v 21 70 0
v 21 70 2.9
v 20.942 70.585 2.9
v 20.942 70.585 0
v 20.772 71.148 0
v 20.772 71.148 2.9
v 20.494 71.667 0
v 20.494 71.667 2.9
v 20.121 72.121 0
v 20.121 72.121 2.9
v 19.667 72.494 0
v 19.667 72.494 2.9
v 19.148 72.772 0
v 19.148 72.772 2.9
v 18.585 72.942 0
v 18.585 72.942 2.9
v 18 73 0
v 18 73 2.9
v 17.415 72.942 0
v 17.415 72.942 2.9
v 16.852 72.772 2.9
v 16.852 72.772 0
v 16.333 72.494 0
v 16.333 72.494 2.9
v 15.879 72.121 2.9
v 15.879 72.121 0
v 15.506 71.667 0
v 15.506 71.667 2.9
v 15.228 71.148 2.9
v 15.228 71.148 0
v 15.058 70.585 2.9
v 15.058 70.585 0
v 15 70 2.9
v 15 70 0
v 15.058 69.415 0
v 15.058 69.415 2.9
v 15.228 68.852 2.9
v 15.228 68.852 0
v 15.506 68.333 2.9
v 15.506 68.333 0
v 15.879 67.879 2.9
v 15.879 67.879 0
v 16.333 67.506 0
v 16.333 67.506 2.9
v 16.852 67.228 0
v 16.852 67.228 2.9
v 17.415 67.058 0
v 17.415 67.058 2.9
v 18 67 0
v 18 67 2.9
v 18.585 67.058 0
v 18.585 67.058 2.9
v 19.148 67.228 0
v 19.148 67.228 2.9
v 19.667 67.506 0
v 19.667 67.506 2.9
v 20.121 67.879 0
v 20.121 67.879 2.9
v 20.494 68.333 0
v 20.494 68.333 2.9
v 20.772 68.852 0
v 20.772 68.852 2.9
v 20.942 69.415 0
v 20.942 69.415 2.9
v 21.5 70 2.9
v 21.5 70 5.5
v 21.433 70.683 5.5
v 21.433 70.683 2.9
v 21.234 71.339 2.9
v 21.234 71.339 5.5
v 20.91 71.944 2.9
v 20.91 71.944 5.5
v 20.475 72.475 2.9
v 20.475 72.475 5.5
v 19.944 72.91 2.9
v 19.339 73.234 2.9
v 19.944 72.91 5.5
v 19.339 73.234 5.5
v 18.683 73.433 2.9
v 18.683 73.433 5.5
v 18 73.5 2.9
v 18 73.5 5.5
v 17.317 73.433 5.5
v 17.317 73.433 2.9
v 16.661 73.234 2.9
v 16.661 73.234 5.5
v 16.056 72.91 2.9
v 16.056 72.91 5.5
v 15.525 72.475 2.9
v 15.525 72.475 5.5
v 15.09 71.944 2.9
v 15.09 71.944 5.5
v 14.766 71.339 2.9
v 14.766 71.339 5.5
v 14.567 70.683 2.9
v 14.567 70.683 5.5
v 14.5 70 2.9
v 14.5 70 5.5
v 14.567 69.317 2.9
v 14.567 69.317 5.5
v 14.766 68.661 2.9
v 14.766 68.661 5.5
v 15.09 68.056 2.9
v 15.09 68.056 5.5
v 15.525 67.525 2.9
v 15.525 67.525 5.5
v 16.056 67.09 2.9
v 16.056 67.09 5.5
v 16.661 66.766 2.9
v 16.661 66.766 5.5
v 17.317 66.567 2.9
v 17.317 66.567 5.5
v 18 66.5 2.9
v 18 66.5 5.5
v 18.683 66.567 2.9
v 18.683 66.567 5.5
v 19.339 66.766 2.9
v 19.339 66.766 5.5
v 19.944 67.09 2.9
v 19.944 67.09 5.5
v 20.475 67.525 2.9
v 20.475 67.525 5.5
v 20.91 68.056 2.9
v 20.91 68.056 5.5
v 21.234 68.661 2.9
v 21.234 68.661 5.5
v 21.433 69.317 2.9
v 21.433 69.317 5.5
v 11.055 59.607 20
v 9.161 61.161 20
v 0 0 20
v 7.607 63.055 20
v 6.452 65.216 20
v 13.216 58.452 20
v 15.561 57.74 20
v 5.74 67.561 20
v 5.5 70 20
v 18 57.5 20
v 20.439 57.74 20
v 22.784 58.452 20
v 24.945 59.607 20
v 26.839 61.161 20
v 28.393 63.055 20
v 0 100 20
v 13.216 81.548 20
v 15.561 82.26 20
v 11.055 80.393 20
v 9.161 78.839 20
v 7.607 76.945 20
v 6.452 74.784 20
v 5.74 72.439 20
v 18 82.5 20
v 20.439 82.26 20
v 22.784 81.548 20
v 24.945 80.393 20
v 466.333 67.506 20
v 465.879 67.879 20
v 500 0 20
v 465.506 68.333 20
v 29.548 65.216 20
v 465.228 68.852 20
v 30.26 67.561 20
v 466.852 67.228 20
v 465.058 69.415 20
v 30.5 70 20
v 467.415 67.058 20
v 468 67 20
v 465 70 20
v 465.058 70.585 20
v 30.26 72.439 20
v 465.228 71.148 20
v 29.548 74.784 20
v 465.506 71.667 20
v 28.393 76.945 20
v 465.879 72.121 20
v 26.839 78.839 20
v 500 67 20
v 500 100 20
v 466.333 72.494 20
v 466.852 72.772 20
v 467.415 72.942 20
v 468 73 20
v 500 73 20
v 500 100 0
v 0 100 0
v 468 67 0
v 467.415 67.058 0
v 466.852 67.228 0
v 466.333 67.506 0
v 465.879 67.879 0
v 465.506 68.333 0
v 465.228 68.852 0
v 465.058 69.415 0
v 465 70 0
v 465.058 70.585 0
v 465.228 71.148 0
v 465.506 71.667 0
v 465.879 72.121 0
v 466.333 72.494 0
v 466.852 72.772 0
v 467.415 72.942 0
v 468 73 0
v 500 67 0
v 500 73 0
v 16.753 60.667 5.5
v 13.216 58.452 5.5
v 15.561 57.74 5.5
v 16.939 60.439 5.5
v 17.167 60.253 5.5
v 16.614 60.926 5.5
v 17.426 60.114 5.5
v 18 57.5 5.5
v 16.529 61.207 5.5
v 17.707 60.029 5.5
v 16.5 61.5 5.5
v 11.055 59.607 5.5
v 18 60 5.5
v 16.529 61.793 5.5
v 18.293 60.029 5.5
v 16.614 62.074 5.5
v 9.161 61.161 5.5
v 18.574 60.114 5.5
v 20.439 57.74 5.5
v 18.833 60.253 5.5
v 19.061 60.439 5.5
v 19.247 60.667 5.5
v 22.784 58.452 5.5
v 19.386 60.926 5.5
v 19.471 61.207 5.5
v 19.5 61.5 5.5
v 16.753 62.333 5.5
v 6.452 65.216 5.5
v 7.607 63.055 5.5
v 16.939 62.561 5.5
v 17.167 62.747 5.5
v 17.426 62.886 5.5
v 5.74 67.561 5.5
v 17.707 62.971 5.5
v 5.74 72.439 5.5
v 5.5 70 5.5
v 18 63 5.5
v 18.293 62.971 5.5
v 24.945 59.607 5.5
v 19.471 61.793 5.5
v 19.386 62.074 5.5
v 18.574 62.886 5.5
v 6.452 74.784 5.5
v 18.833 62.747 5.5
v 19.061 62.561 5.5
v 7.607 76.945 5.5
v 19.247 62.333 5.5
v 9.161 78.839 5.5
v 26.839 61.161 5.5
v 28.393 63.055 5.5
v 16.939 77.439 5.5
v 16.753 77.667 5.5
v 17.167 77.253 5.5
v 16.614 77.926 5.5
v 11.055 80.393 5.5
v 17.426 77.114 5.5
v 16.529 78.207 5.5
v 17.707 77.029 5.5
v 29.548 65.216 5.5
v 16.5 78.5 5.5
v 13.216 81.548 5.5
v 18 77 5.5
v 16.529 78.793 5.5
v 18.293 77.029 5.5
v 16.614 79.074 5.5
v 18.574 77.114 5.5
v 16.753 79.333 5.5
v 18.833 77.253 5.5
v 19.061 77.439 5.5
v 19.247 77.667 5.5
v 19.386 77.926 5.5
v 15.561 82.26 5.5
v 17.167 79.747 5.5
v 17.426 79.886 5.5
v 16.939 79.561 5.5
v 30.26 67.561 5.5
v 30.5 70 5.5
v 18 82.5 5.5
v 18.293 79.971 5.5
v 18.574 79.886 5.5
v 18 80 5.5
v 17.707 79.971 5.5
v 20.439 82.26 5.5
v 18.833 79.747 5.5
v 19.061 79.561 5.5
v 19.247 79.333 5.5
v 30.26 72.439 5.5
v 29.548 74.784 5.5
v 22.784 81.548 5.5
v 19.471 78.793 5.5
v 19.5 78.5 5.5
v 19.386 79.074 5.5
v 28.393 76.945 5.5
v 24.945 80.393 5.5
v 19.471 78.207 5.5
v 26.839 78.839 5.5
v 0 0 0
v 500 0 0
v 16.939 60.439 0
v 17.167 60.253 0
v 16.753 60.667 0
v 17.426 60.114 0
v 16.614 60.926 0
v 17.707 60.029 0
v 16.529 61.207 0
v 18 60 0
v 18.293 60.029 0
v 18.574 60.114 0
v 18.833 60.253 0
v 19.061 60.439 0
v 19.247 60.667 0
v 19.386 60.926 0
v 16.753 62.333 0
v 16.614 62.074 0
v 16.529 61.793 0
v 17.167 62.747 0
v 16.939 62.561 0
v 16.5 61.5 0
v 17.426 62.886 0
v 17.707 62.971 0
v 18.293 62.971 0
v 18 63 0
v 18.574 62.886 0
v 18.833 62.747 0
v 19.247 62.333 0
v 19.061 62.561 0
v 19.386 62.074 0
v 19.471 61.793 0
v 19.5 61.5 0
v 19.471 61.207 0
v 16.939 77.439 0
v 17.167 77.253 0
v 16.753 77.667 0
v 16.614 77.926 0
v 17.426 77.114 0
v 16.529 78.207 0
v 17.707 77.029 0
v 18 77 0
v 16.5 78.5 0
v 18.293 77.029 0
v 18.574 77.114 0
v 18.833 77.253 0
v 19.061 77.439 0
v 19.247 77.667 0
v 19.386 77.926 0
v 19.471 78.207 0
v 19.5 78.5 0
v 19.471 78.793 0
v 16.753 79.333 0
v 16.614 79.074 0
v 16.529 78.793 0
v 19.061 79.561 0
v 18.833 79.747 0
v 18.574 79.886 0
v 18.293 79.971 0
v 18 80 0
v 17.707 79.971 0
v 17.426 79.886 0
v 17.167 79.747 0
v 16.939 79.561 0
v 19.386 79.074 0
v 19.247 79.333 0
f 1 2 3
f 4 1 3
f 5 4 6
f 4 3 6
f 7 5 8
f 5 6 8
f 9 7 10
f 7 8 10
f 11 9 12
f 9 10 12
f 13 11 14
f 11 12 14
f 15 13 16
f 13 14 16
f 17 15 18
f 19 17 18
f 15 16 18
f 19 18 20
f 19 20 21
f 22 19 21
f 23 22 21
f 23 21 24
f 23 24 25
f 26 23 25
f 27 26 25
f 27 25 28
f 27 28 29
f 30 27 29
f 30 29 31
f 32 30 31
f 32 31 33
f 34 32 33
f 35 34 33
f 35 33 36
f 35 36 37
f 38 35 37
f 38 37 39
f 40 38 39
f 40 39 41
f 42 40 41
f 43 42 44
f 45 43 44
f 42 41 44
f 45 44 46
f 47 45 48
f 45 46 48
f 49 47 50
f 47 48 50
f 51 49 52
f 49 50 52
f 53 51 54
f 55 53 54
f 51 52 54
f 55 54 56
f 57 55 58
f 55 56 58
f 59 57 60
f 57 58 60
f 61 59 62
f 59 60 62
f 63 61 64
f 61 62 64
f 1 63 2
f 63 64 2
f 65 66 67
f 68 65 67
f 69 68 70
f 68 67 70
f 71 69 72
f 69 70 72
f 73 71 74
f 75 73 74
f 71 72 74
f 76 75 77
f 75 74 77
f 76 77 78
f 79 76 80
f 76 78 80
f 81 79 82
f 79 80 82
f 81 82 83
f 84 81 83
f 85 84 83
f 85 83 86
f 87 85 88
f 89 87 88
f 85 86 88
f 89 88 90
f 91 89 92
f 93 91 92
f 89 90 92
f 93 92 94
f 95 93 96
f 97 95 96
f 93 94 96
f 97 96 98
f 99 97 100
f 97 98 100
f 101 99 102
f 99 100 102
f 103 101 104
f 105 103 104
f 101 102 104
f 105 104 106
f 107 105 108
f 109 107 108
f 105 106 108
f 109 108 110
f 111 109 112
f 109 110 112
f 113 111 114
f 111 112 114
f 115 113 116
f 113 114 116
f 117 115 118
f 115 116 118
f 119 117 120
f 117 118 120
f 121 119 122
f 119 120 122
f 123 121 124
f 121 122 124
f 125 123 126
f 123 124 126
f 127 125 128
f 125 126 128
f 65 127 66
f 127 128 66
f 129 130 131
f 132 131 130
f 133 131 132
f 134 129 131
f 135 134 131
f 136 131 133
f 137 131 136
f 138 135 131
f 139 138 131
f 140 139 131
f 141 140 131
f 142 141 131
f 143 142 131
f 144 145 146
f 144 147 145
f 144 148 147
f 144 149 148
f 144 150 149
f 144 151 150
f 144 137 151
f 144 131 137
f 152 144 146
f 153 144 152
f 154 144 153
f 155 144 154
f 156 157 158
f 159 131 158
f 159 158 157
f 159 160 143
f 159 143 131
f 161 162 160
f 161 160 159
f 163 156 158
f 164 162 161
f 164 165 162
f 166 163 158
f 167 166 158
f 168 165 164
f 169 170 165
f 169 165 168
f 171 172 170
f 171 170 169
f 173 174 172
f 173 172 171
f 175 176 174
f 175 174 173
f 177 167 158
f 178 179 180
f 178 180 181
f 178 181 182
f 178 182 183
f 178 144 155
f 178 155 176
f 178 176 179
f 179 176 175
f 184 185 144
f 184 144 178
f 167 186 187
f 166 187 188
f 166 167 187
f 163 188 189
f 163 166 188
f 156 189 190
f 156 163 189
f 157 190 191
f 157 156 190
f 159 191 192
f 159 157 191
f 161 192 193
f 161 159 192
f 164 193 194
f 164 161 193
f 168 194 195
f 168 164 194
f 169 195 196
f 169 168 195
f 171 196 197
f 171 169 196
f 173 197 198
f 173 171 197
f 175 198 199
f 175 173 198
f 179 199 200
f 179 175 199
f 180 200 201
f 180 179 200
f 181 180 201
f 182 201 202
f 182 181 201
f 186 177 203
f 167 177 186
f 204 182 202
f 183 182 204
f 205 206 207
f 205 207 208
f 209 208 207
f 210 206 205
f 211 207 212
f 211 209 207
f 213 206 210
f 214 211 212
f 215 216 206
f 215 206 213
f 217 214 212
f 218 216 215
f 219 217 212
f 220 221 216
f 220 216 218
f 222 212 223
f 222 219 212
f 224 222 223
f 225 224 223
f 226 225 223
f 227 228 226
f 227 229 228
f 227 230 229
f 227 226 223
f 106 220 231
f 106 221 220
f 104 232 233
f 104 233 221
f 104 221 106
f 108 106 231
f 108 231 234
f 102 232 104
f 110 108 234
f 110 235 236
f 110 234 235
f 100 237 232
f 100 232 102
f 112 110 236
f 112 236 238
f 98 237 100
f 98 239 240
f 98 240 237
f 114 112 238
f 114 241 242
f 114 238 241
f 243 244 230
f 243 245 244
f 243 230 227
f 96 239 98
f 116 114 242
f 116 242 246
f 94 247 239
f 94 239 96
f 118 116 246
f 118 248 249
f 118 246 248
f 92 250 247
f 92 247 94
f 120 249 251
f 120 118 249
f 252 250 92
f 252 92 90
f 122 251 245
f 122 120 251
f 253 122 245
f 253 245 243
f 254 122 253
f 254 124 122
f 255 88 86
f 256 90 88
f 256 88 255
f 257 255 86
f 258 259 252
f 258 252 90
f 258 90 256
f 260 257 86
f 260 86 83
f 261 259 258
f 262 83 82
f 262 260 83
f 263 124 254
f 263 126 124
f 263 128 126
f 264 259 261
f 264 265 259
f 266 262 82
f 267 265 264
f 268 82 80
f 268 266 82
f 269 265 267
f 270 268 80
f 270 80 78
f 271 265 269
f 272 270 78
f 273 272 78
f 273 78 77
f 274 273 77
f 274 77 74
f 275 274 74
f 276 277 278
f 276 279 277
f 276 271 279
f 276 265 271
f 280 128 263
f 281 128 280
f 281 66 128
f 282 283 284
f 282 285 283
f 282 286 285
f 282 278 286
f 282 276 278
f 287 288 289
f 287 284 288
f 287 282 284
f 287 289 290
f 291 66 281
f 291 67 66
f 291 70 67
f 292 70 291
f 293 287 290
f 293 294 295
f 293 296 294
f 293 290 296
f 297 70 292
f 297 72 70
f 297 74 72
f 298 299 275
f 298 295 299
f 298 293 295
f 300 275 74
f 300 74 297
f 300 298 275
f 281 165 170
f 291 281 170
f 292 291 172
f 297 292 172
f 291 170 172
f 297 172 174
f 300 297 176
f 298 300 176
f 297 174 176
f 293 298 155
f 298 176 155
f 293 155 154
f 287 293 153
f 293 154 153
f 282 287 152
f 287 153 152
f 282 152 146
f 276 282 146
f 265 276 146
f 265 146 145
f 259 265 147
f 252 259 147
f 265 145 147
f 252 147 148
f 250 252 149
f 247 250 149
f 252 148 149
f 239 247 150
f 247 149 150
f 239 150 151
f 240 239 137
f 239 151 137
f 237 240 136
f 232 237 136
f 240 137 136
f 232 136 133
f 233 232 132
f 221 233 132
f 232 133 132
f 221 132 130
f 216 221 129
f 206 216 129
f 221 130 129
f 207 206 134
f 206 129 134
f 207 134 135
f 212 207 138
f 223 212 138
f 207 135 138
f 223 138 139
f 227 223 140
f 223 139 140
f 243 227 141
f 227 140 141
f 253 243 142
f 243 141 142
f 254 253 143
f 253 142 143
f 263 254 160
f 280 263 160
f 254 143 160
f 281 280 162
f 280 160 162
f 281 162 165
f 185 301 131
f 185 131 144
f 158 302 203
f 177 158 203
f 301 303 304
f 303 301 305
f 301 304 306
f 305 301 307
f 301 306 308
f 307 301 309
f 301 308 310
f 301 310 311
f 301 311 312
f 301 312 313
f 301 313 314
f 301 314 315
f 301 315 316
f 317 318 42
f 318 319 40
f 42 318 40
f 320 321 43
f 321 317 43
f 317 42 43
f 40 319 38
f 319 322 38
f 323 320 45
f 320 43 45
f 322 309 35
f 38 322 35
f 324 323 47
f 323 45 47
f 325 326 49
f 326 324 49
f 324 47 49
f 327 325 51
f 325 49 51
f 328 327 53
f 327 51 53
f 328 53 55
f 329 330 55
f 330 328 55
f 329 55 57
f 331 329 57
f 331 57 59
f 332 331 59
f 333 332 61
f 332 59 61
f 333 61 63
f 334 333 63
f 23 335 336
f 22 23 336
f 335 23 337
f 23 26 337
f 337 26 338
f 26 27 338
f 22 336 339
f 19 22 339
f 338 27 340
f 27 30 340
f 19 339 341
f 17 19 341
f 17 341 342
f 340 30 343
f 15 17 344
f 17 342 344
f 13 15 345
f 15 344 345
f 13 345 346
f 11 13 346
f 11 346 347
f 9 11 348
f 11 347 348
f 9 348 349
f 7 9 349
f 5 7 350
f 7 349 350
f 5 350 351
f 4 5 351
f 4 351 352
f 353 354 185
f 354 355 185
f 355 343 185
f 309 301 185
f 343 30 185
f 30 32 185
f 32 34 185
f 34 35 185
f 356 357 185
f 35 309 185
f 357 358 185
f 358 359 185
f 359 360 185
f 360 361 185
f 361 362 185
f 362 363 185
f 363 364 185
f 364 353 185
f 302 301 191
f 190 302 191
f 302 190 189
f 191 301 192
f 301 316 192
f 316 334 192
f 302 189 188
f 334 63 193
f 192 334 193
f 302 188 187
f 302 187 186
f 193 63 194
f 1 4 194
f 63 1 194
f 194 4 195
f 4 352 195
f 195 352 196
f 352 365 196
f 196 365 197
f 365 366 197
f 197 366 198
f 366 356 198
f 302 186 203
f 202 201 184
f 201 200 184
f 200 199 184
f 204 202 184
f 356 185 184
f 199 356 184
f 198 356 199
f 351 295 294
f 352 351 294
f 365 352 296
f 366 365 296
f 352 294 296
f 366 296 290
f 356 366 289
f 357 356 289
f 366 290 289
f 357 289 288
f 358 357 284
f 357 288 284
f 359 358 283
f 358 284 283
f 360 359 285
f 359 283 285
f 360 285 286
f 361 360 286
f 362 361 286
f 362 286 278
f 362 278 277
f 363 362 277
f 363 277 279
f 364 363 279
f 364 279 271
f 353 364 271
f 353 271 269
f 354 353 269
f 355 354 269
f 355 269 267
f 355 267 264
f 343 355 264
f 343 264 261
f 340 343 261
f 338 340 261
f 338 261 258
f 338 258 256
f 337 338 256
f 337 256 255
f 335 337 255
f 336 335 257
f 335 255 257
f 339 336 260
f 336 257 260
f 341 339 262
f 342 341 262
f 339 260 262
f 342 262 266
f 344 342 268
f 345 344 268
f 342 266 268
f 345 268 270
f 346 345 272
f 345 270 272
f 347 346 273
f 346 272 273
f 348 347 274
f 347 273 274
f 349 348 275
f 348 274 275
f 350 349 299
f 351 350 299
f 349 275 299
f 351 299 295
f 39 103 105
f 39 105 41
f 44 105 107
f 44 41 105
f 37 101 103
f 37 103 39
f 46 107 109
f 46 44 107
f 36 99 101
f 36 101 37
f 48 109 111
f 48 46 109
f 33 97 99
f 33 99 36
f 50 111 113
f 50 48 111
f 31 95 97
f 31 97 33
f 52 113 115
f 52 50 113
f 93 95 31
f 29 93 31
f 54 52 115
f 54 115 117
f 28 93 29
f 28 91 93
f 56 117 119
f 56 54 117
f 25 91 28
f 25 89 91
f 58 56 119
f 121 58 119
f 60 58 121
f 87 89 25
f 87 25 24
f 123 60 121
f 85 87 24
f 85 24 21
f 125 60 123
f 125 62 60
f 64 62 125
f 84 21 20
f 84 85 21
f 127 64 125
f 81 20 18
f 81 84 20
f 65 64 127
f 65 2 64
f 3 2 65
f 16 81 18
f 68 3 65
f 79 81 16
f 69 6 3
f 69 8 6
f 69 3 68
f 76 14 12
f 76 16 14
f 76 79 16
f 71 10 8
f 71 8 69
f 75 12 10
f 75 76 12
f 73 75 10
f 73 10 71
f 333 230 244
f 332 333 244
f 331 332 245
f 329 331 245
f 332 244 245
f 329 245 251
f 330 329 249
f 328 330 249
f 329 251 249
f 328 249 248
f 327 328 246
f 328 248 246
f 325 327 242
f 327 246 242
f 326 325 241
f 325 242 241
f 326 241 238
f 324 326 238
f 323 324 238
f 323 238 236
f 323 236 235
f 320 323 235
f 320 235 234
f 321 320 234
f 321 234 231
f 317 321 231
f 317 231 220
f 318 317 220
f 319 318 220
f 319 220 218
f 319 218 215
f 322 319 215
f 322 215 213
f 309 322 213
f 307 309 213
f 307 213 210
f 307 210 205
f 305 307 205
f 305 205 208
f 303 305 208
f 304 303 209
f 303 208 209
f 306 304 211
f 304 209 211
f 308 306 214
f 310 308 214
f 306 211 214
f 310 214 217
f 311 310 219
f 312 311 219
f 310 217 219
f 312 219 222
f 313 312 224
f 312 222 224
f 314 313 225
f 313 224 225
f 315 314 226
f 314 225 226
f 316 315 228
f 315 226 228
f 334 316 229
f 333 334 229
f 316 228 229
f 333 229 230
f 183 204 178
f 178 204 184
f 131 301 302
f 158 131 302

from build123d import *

# Parameters (mm, degrees)
SKETCH1_W           = 500
SKETCH1_H           = 100
BOSS_EXTRUDE1_DEPTH = 20
SKETCH2_R           = 3
CUT_EXTRUDE1_DEPTH  = 511.294032887
SKETCH3_R           = 12.5
CUT_EXTRUDE2_DEPTH  = 14.5
SKETCH4_R           = 3.5
CUT_EXTRUDE3_DEPTH  = 2.6
SKETCH5_R           = 1.5
CUT_EXTRUDE4_DEPTH  = 511.108076784


with BuildPart() as part:
    # Sketch1 → Boss-Extrude1 (new body)
    with BuildSketch(Plane.XY):
        with Locations((250, 50)):
            Rectangle(SKETCH1_W, SKETCH1_H)
    extrude(amount=BOSS_EXTRUDE1_DEPTH)

    # Sketch2 → Cut-Extrude1 (cut, through all)
    with BuildSketch(Plane.XY.offset(20)):
        with Locations((18, 70)):
            Circle(SKETCH2_R)
        with BuildLine():
            Line((468, 73), (520, 73))
            ThreePointArc((520, 73), (523, 70), (520, 67))
            Line((520, 67), (468, 67))
            ThreePointArc((468, 67), (465, 70), (468, 73))
        make_face()
    extrude(amount=-CUT_EXTRUDE1_DEPTH, mode=Mode.SUBTRACT)

    # Sketch3 → Cut-Extrude2 (cut)
    with BuildSketch(Plane.XY.offset(20)):
        with Locations((18, 70)):
            Circle(SKETCH3_R)
    extrude(amount=-CUT_EXTRUDE2_DEPTH, mode=Mode.SUBTRACT)

    # Sketch4 → Cut-Extrude3 (cut)
    with BuildSketch(Plane.XY.offset(5.5)):
        with Locations((18, 70)):
            Circle(SKETCH4_R)
    extrude(amount=-CUT_EXTRUDE3_DEPTH, mode=Mode.SUBTRACT)

    # Sketch5 → Cut-Extrude4 (cut, through all)
    with BuildSketch(Plane.XY.offset(5.5)):
        with Locations((18, 61.5)):
            Circle(SKETCH5_R)
        with Locations((18, 78.5)):
            Circle(SKETCH5_R)
    extrude(amount=-CUT_EXTRUDE4_DEPTH, mode=Mode.SUBTRACT)


solid = part.part
